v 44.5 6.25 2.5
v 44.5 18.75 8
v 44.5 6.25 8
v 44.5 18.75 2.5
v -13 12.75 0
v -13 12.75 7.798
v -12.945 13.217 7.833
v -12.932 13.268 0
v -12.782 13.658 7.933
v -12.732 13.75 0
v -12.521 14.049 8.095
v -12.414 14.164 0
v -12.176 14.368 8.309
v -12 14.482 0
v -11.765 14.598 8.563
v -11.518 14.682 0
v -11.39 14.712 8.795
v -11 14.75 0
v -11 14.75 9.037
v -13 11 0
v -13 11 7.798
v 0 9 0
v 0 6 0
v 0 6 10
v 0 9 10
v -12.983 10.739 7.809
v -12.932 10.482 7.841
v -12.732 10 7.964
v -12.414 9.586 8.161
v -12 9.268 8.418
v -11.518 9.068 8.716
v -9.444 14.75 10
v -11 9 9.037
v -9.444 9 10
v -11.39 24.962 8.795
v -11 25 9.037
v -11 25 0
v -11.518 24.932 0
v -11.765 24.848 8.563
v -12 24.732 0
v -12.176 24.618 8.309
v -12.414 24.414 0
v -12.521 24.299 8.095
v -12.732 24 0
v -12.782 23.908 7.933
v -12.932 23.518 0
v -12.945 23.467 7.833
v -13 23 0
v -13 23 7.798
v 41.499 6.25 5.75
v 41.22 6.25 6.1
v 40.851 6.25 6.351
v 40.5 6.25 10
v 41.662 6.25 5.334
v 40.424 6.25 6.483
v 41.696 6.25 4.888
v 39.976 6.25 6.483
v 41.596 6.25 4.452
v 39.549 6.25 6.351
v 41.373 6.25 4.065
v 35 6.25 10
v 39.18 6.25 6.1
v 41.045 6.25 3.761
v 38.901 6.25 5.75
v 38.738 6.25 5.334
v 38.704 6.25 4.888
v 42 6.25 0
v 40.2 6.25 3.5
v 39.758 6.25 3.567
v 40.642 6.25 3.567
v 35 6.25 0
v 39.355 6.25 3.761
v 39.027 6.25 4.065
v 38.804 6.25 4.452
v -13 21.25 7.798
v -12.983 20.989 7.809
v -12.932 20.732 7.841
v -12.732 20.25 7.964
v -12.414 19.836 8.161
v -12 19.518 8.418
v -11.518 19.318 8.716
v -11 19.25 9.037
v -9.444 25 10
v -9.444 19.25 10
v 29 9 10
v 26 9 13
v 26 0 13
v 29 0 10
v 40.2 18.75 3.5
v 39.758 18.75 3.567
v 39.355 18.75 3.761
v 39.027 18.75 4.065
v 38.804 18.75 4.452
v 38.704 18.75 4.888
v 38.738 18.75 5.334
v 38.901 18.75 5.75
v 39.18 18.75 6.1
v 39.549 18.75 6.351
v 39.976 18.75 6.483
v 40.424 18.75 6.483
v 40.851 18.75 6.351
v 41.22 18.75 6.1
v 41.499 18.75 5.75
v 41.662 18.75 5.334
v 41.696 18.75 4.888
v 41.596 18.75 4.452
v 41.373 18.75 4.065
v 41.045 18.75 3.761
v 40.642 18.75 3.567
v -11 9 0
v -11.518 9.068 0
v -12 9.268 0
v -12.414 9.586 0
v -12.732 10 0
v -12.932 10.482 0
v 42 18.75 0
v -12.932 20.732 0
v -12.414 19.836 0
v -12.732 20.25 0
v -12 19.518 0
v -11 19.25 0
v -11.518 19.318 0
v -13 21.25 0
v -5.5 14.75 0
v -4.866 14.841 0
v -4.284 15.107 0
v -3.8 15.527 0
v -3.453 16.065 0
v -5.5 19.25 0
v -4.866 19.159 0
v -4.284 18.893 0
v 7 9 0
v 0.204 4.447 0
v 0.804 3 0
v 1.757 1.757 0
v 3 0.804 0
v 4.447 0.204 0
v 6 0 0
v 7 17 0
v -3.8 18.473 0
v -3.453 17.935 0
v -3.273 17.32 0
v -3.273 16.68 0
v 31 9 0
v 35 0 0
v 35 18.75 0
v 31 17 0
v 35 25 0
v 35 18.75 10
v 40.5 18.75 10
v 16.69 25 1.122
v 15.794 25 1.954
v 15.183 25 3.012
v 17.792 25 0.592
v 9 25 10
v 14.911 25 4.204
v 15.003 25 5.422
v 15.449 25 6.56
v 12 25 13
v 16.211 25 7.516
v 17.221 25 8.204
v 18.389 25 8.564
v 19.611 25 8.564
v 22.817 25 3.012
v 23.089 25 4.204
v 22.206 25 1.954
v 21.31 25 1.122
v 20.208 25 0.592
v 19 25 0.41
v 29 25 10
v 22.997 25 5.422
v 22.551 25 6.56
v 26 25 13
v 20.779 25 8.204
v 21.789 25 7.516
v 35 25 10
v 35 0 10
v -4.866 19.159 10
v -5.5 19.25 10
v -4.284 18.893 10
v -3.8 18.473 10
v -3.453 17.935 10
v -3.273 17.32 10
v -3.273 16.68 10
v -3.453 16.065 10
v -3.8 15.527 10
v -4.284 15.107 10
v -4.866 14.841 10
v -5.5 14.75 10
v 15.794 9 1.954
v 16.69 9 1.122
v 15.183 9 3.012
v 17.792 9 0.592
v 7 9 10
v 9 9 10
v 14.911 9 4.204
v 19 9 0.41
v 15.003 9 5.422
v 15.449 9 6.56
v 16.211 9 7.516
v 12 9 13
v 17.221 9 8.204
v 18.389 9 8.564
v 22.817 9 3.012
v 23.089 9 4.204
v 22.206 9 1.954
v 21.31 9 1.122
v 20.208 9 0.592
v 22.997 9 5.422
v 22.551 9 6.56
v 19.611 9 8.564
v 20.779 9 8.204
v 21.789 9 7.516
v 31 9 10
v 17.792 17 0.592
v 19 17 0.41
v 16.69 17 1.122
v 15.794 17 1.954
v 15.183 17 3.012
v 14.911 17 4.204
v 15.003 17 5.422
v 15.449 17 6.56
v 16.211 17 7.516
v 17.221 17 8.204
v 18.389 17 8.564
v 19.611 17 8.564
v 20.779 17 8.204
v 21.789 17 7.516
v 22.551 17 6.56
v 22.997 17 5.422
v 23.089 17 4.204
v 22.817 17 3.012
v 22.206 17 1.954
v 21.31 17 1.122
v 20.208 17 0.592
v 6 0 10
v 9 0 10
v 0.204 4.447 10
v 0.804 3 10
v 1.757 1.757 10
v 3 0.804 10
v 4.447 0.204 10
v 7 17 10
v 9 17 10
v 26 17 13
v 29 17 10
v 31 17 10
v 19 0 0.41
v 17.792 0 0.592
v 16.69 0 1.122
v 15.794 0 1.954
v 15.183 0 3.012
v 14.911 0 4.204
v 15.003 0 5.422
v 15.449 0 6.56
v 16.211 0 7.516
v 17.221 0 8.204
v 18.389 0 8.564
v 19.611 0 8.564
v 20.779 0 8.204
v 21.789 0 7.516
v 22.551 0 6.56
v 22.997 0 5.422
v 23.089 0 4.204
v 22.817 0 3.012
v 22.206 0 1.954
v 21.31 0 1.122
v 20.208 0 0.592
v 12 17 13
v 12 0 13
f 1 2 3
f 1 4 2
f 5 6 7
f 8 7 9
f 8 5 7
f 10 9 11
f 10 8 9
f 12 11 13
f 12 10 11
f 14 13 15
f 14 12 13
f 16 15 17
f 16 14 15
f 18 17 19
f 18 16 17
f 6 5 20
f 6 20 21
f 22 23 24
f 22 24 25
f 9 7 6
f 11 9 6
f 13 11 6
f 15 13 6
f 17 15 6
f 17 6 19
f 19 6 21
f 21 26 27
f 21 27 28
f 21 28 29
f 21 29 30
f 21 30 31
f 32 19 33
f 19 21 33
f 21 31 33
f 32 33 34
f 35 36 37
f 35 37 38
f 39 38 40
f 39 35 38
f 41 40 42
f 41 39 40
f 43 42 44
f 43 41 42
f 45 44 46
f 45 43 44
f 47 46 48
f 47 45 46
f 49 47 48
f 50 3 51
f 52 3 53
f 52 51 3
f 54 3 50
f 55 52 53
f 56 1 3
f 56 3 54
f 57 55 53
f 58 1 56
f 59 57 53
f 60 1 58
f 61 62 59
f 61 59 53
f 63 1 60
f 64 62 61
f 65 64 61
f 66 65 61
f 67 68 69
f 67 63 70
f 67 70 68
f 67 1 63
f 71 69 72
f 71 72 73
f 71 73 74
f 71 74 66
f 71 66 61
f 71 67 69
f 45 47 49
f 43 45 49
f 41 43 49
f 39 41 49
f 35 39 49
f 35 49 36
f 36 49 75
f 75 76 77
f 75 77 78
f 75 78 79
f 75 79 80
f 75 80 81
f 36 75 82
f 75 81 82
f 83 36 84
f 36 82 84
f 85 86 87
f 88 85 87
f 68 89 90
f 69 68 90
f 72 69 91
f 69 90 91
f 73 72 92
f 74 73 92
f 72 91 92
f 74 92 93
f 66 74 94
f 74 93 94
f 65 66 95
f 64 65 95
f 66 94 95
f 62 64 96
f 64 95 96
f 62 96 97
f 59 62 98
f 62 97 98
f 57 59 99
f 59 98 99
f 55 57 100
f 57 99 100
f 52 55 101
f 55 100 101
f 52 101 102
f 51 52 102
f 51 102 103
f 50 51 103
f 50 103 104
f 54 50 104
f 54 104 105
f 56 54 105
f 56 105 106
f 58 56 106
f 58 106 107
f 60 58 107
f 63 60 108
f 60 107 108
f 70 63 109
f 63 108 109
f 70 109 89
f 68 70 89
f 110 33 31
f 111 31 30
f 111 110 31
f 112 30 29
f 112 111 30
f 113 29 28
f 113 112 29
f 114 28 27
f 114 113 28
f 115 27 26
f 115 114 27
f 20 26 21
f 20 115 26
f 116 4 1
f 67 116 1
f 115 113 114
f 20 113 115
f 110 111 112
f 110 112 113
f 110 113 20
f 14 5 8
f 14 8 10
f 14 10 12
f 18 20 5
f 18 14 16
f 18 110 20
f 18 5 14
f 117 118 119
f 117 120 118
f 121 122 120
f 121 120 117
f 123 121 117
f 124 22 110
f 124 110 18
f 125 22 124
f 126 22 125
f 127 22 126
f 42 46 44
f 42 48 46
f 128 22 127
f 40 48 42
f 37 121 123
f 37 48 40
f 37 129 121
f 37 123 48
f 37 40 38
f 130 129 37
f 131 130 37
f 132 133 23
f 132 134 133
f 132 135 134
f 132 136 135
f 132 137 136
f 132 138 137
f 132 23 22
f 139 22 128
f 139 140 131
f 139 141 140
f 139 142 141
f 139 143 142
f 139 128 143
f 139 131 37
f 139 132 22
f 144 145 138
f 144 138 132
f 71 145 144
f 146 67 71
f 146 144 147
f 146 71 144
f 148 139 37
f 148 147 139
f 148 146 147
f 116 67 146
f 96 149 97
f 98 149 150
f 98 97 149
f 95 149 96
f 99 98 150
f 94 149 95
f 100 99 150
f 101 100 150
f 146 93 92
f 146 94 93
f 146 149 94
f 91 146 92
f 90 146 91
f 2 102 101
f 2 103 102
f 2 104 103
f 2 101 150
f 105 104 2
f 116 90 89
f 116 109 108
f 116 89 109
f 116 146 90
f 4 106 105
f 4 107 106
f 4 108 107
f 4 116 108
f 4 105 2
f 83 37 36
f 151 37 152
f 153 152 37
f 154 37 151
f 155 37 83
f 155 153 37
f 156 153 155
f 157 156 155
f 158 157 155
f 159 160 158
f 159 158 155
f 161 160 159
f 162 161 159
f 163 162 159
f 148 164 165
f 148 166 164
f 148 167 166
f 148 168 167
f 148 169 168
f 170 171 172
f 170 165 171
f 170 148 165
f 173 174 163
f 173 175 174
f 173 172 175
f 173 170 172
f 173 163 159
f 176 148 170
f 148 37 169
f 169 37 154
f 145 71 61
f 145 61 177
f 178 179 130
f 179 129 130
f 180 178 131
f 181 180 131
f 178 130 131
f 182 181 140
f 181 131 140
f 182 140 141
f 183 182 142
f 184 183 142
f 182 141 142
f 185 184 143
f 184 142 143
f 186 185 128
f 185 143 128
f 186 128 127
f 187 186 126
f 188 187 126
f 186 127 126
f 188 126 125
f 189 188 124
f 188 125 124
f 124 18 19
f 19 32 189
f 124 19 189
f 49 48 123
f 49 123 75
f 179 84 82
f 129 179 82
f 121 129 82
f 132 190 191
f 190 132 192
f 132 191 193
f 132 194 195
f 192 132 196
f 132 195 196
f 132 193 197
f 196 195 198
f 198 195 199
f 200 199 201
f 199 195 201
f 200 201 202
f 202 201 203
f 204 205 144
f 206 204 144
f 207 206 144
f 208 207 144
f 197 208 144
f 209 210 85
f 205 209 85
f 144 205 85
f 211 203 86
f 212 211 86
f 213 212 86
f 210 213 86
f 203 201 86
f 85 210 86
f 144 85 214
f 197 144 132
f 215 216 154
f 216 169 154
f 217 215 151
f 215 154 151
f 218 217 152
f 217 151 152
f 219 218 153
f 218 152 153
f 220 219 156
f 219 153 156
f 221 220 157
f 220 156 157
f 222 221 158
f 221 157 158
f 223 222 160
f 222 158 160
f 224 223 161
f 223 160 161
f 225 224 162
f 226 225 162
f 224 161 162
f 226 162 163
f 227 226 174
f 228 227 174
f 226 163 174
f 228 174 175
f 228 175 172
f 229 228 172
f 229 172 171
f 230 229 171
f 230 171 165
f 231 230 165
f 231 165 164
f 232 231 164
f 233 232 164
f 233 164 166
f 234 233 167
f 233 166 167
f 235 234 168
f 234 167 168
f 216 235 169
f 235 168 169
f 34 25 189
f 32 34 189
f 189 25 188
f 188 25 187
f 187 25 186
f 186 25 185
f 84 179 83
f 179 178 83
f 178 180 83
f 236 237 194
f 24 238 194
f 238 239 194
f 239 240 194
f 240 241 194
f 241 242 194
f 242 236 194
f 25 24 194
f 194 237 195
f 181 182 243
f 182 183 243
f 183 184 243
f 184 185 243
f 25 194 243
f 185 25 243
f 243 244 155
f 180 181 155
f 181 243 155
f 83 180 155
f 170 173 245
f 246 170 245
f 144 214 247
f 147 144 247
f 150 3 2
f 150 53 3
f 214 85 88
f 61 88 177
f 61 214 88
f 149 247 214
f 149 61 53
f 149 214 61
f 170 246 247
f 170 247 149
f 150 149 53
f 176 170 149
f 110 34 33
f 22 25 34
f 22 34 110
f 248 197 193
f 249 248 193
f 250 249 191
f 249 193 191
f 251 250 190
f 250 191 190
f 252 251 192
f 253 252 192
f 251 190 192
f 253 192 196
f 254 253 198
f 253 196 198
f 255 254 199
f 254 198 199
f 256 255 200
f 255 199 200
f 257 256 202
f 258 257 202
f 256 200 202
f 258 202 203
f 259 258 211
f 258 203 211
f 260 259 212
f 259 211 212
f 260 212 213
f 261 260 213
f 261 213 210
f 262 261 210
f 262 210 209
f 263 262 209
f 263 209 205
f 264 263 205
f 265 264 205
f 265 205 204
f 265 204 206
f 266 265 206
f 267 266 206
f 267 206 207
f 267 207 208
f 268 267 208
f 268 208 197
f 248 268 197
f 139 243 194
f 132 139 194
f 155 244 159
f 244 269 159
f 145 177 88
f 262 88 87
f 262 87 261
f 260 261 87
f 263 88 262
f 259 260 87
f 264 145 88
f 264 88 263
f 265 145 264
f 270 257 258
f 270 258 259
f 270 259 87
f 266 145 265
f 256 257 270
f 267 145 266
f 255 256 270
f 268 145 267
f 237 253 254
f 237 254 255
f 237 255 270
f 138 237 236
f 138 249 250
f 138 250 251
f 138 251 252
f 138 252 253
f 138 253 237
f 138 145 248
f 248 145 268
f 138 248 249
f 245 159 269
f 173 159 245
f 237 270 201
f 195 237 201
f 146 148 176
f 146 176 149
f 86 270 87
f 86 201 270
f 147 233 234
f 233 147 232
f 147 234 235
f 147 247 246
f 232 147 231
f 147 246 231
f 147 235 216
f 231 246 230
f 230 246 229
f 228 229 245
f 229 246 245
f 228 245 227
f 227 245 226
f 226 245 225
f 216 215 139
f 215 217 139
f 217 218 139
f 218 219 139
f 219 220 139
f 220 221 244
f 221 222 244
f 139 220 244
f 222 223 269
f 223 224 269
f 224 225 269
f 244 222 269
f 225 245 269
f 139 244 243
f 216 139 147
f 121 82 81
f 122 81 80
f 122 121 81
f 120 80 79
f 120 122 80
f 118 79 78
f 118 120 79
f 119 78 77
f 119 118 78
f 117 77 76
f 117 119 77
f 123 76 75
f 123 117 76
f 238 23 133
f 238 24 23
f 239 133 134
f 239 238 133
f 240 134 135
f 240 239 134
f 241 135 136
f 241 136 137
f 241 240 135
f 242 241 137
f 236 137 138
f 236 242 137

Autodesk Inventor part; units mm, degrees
ref_plane "YZ Plane" through (0, 0, 0) normal (1, 0, 0) x (0, 1, 0)
ref_plane "XZ Plane" through (0, 0, 0) normal (0, 1, 0) x (-1, 0, 0)
ref_plane "XY Plane" through (0, 0, 0) normal (0, 0, 1) x (1, 0, 0)
sketch "Sketch1" plane through (0, 0, 0) normal (0, 0, 1) x (1, 0, 0)
  line L0 (0, 0) -> (0, 25)
  line L1 (0, 25) -> (35, 25)
  line L2 (35, 25) -> (35, 18.75)
  line L3 (35, 18.75) -> (44.5, 18.75)
  line L4 (44.5, 18.75) -> (44.5, 6.25)
  line L5 (44.5, 6.25) -> (35, 6.25)
  line L6 (35, 6.25) -> (35, 0)
  line L7 (35, 0) -> (0, 0)
  point P0 (0, 12.5)
  point P1 (44.5, 12.5)
  dimension "d0" = 25
  dimension "d1" = 35
  dimension "d2" = 12.5
  dimension "d3" = 6.25
  dimension "d4" = 9.5
extrude "Extrusion1" add sketch "Sketch1" along normal blind 10
hole "Hole1" at (40.2, 6.25, 5) direction (0, 1, 0) diameter 3 end through all
chamfer "Chamfer1" distance 2.5 angle 45 1 edges at (44.5, 12.5, 0)
hole "Hole2" at (19, 0, 4.51) direction (0, 1, 0) diameter 8.2 end through all
sketch "Sketch2" plane through (0, 0, 10) normal (0, 0, 1) x (1, 0, 0)
  line L0 (0, 25) -> (35, 25) projected
  line L1 (35, 0) -> (0, 0) projected
  line L2 (23.1, 25) -> (23.1, 0) projected
  line L3 (14.9, 25) -> (14.9, 0) projected
  line L4 (9, 0) -> (29, 0)
  line L5 (29, 0) -> (29, 25)
  line L6 (29, 25) -> (9, 25)
  line L7 (9, 25) -> (9, 0)
  dimension "d28" = 20
  dimension "d29" = 6
extrude "Extrusion2" add sketch "Sketch2" along normal blind 3
chamfer "Chamfer2" distance 3 angle 45 2 edges at (29, 12.5, 13) (9, 12.5, 13)
sketch "Sketch3" plane through (0, 0, 0) normal (-1, 0, 0) x (0, 0, 1)
  line L0 (10, 0) -> (10, 25) projected
  line L1 (0, 25) -> (10, 25)
  line L2 (10, 25) -> (10, 9)
  line L3 (10, 9) -> (0, 9)
  line L4 (0, 9) -> (0, 25)
  dimension "d35" = 16
extrude "Extrusion3" add sketch "Sketch3" along normal blind 13
hole "Hole3" at (-5.5, 17, 10) direction (0, 0, -1) diameter 4.5 end through all
sketch "Sketch4" plane through (0, 0, 10) normal (0, 0, 1) x (1, 0, 0)
  circle A0 centre (-5.5, 17) radius 2.25 projected
  line L0 (-13, 25) -> (-13, 9) projected
  line L1 (-5.5, 19.25) -> (-13, 19.25)
  line L2 (-13, 19.25) -> (-13, 14.75)
  line L3 (-13, 14.75) -> (-5.5, 14.75)
  line L4 (-5.5, 14.75) -> (-5.5, 19.25)
extrude "Extrusion4" cut sketch "Sketch4" against normal through all contours L4 A0 | A0 L3 L0 L1 picked at (-6.2445, 17.0904)
fillet "Fillet1" radius 2 4 edges at (-13, 25, 5) (-13, 19.25, 5) (-13, 14.75, 5) (-13, 9, 5)
sketch "Sketch5" plane through (0, 9, 0) normal (0, -1, 0) x (1, 0, 0)
  line L0 (0, 10) -> (-11, 10) projected
  line L1 (-13, 10) -> (-13, 0) projected
  line L2 (-13, 10) -> (-11, 10) projected
  line L3 (-13, 10) -> (-9.4444, 10)
  line L4 (-13, 7.7985) -> (-13, 10)
  line L5 (-13, 7.7985) -> (-9.4444, 10)
  dimension "d52" = 3.5556
  dimension "d53" = 2.2015
extrude "Extrusion5" cut sketch "Sketch5" against normal through all
fillet "Fillet2" radius 6 1 edges at (0, 0, 5)
sketch "Sketch6" plane through (0, 0, 13) normal (0, 0, 1) x (1, 0, 0)
  line L0 (9, 0) -> (9, 25) projected
  line L1 (-9.4444, 25) -> (9, 25) projected
  line L2 (12, 25) -> (9, 25) projected
  line L3 (29, 25) -> (26, 25) projected
  line L4 (29, 25) -> (35, 25) projected
  line L5 (9, 0) -> (6, 0) projected
  line L6 (26, 0) -> (29, 0) projected
  line L7 (35, 0) -> (29, 0) projected
  line L8 (23.1, 25) -> (23.1, 0) projected
  line L9 (14.9, 25) -> (14.9, 0) projected
  line L10 (7, 9) -> (31, 9)
  line L11 (31, 9) -> (31, 17)
  line L12 (31, 17) -> (7, 17)
  line L13 (7, 17) -> (7, 9)
  point P0 (0, 0)
  dimension "d55" = 24
  dimension "d56" = 8
  dimension "d57" = 9
  dimension "d58" = 7.9
extrude "Extrusion6" cut sketch "Sketch6" against normal through all
chamfer "Chamfer3" distance 2 distance2 4 1 edges at (44.5, 12.5, 10) measured on face at (44.5, 14.5833, 5)
properties part number "idler mount"
